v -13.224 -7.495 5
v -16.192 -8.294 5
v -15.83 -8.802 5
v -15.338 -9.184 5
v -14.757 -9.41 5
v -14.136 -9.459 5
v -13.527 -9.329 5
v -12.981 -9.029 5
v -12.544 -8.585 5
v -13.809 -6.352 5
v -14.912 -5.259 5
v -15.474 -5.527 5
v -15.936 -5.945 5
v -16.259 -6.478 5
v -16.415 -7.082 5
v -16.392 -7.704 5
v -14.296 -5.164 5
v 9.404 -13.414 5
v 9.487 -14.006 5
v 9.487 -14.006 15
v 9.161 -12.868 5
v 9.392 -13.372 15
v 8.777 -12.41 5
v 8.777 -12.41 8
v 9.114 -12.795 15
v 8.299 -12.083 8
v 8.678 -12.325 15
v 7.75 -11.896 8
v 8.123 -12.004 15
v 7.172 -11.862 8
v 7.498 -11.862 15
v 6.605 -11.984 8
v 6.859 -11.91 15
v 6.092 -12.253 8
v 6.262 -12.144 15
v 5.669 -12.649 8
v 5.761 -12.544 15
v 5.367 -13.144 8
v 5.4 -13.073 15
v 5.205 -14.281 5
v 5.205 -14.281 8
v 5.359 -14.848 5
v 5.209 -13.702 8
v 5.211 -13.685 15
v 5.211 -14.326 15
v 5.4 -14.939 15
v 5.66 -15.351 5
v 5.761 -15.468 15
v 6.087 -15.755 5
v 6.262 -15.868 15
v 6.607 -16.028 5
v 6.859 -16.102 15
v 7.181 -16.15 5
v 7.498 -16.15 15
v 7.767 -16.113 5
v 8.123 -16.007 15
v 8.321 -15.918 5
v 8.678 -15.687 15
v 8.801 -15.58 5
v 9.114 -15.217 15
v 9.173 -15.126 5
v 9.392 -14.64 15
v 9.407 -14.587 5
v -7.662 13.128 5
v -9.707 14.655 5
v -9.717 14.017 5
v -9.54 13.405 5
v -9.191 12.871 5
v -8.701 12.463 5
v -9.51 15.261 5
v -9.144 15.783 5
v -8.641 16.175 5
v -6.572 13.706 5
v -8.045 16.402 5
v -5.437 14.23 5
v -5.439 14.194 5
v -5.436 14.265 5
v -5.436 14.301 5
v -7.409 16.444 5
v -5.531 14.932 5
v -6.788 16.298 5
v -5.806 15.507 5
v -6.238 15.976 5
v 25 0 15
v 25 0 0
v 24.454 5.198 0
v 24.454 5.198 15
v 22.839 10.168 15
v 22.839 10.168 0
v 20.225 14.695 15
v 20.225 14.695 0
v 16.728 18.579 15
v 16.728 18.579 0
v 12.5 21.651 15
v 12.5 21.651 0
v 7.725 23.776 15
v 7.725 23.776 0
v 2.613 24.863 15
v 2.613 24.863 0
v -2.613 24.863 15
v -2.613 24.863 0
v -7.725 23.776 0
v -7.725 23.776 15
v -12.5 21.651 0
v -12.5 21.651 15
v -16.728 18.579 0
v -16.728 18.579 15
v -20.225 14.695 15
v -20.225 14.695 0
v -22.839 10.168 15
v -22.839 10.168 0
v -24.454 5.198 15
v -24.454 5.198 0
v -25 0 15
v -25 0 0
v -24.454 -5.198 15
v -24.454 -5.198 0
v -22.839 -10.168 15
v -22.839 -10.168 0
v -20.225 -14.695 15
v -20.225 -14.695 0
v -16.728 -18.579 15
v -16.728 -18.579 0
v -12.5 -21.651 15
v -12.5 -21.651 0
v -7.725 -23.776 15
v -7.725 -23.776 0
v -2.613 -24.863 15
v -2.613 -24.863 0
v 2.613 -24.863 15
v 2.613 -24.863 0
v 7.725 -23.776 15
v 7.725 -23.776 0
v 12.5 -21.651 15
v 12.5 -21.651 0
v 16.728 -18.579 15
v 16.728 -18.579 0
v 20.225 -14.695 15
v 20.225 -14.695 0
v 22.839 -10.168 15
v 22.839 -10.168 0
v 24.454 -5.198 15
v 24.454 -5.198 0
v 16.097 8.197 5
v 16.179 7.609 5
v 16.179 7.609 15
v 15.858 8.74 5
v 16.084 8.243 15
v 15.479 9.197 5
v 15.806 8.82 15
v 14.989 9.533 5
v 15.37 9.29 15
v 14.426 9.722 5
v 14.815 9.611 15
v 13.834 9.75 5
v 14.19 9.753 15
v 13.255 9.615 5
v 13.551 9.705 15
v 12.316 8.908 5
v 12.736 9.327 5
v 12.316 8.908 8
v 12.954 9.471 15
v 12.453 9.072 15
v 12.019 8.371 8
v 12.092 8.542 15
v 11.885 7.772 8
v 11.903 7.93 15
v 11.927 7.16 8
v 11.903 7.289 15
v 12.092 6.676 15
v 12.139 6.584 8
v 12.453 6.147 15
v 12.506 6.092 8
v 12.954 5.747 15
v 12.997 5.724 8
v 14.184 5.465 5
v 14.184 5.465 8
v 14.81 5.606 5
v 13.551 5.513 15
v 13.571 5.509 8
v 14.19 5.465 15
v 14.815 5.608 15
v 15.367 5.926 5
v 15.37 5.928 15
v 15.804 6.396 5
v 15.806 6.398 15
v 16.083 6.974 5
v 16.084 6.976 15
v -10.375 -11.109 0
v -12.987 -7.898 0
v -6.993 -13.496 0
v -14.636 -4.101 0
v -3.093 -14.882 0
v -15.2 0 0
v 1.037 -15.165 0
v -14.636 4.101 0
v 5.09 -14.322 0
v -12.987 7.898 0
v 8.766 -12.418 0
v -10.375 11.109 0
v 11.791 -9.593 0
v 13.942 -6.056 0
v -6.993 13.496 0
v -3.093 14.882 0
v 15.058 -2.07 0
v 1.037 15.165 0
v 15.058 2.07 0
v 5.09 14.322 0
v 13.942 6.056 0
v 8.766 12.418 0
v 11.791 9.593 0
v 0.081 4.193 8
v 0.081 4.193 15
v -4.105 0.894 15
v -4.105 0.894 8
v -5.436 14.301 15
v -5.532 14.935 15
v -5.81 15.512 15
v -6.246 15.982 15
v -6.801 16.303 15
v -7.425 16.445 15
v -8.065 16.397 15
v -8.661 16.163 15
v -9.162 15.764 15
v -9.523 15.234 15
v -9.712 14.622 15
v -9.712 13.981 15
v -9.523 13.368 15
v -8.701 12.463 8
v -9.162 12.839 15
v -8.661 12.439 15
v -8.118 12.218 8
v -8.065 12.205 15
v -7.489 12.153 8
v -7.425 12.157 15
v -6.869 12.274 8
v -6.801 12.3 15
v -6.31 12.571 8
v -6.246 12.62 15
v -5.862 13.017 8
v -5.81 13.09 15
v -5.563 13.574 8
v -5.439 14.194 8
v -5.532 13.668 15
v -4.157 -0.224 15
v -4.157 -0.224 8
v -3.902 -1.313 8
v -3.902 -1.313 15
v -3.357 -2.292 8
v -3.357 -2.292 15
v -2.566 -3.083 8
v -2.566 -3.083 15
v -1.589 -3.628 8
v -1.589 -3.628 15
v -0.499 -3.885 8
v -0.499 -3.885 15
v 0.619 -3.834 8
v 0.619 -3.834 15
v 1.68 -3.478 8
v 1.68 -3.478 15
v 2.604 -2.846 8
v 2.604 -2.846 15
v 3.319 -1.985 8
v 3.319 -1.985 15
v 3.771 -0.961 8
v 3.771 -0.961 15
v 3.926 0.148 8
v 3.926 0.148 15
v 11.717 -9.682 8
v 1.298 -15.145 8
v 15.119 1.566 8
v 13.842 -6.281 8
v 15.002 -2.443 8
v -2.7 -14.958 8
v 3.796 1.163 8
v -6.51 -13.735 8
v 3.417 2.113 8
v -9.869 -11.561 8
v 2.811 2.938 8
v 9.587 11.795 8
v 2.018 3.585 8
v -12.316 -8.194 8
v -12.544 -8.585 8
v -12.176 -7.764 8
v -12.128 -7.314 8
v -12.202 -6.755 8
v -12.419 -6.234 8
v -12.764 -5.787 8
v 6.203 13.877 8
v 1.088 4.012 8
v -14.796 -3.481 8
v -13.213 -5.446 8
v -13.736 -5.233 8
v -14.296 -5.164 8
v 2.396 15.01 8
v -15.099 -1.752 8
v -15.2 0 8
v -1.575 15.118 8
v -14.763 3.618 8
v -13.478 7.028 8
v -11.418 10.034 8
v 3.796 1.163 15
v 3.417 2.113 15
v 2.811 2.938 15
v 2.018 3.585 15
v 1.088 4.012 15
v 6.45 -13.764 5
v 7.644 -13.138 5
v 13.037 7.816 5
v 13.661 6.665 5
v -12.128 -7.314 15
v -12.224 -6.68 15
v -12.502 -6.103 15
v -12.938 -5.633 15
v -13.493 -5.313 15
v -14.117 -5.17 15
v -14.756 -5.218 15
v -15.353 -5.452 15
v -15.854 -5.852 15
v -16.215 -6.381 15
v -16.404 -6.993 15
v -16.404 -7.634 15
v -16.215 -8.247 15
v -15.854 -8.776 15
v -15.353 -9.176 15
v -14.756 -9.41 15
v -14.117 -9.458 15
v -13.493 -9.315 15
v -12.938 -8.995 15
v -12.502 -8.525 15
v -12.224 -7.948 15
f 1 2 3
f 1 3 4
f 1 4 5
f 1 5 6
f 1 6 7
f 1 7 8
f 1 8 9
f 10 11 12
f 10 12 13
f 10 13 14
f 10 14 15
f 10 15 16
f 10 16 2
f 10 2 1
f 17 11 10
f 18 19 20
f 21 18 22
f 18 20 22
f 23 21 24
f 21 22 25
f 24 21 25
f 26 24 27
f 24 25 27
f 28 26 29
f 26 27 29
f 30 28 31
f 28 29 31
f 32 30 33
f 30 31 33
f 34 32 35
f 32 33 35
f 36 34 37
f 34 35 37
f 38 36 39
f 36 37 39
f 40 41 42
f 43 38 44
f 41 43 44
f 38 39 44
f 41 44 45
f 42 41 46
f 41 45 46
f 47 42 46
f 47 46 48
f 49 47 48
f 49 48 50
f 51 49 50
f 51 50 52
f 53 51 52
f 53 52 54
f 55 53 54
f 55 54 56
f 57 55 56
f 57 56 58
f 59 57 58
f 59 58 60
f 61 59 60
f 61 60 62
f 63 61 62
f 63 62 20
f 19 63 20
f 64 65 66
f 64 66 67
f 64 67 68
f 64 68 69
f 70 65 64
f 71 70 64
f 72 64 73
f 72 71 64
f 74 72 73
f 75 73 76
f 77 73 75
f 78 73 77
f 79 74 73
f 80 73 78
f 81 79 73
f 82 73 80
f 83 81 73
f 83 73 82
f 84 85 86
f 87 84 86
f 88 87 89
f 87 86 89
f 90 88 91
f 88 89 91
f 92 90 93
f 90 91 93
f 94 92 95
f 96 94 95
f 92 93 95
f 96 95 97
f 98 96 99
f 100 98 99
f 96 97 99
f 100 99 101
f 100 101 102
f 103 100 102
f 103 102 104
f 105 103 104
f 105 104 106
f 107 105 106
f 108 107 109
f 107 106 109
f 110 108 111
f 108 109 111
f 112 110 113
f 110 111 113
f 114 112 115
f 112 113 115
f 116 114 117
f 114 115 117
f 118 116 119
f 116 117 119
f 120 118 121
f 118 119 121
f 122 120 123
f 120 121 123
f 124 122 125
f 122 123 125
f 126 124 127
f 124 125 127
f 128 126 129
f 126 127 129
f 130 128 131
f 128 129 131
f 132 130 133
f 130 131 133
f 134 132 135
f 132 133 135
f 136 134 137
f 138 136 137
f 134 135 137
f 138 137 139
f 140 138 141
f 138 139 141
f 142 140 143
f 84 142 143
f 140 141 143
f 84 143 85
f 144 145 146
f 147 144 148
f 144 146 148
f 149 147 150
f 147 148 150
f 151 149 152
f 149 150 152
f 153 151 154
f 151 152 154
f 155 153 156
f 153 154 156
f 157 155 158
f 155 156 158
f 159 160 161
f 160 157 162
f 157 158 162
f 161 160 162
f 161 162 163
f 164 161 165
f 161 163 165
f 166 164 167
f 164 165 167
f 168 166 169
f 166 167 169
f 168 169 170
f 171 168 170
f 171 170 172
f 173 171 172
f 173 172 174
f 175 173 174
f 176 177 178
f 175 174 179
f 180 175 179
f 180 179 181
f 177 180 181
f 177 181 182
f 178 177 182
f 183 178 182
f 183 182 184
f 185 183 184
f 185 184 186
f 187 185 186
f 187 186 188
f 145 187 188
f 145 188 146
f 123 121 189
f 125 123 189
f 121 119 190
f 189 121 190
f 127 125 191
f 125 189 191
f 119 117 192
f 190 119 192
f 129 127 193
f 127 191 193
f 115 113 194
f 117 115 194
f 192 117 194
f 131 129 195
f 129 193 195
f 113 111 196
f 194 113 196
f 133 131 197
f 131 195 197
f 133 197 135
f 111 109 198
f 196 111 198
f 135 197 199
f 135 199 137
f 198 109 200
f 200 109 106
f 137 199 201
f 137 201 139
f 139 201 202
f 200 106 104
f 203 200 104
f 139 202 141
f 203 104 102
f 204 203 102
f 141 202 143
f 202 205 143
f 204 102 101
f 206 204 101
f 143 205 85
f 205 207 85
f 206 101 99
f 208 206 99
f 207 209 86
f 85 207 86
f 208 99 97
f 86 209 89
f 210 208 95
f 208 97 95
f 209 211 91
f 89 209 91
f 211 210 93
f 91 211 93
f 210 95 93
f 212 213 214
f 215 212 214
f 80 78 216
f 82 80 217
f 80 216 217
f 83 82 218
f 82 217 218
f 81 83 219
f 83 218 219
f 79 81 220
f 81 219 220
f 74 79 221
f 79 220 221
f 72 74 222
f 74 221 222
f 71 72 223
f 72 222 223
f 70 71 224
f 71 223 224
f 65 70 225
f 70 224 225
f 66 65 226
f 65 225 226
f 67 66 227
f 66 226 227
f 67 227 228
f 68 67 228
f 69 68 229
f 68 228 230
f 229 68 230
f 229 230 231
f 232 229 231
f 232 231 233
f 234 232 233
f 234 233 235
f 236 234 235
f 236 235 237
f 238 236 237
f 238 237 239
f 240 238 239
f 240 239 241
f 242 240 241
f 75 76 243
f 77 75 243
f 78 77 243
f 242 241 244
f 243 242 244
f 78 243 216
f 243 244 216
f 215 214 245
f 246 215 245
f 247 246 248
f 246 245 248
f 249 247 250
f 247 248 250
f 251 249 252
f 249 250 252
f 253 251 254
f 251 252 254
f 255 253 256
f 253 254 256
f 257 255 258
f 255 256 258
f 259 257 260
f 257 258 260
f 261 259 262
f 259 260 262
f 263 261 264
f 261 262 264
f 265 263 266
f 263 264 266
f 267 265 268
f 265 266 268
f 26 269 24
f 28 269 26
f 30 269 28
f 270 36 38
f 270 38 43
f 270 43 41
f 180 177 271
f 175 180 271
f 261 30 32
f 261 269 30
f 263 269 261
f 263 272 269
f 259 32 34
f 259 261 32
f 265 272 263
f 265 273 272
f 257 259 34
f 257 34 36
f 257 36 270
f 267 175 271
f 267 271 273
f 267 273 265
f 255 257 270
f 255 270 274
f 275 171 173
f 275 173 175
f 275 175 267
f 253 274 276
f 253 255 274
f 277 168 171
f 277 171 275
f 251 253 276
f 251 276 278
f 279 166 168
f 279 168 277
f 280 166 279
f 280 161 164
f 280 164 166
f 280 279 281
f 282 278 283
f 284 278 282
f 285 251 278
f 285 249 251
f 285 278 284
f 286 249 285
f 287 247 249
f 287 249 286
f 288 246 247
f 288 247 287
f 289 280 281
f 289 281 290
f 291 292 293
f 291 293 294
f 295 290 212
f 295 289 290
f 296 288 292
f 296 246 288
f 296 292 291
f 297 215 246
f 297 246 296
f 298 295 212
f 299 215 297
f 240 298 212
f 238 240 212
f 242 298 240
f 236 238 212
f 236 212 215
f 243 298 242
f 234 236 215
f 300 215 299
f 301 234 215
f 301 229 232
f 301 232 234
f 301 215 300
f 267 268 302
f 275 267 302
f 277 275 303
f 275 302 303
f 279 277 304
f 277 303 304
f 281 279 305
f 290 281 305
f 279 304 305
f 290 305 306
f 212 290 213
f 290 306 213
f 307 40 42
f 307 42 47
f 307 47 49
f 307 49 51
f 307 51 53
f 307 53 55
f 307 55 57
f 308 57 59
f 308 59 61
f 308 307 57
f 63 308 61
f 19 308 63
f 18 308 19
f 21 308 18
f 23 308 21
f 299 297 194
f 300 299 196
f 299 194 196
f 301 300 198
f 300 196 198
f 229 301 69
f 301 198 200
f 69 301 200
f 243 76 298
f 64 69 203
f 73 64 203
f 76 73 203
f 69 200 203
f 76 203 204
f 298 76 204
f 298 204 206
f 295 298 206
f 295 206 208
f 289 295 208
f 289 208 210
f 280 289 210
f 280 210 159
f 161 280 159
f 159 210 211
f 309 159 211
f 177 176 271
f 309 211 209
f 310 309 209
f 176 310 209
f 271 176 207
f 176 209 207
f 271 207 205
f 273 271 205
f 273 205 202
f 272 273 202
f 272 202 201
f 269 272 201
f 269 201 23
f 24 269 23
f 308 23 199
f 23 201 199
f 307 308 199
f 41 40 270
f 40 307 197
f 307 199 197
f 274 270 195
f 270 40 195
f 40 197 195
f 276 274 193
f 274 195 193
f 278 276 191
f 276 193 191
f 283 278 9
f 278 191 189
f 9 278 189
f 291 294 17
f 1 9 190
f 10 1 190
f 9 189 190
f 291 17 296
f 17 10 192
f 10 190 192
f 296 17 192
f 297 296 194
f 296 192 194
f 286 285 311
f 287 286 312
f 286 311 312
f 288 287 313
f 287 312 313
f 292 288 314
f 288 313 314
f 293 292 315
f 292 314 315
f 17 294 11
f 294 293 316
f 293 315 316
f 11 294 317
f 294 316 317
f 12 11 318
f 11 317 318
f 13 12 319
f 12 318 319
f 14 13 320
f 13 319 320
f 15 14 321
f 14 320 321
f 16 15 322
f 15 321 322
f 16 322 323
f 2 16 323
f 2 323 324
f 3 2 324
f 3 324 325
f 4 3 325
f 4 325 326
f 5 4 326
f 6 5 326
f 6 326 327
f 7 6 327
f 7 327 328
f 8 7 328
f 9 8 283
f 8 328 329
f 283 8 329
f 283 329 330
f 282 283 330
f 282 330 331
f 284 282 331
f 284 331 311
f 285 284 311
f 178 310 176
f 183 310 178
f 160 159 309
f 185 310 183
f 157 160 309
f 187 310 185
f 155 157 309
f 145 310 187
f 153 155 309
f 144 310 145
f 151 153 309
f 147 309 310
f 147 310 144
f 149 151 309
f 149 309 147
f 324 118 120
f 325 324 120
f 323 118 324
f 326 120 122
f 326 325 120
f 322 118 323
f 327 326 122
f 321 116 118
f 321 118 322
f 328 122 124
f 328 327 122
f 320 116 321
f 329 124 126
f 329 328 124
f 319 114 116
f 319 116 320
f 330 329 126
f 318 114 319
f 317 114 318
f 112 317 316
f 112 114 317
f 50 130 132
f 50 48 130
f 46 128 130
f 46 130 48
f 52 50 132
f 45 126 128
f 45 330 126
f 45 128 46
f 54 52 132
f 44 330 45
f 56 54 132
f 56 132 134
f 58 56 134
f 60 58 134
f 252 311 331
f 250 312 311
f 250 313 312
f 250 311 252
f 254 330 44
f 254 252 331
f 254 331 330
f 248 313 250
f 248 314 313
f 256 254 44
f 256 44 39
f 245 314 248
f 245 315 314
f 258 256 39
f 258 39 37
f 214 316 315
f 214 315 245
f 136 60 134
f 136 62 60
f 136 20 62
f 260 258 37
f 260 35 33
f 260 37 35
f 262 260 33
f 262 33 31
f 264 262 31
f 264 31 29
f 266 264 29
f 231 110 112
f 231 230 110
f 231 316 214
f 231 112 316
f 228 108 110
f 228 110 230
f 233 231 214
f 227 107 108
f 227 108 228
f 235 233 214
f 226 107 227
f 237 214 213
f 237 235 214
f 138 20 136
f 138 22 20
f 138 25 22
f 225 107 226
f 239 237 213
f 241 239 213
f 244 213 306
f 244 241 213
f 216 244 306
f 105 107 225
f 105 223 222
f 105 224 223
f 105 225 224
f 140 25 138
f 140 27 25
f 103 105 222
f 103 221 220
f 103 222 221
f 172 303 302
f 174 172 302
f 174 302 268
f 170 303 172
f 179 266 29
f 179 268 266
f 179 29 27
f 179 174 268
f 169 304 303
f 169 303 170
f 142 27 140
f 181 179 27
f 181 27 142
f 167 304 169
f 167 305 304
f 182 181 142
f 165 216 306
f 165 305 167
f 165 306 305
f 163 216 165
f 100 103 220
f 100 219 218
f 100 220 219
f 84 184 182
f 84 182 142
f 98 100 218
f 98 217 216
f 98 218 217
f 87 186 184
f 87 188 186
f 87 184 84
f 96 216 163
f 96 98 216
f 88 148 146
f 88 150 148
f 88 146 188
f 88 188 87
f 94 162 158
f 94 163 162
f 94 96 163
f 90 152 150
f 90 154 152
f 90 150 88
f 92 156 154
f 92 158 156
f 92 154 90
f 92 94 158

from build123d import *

# Parameters (mm, degrees)
SKETCH_1_R          = 25
EXTRUDE_1_DEPTH     = 15
SKETCH_2_R          = 15.2
CUT_EXTRUDE_1_DEPTH = 8
SKETCH_3_R          = 2.15
CUT_EXTRUDE_2_DEPTH = 10
CUT_EXTRUDE_3_DEPTH = 39.405728739


with BuildPart() as part:
    # 草图1 → 凸台-拉伸1 (new body)
    with BuildSketch(Plane.XY):
        Circle(SKETCH_1_R)
    extrude(amount=EXTRUDE_1_DEPTH)

    # 草图2 → 切除-拉伸1 (cut)
    with BuildSketch(Plane(origin=(0, 0, 0), x_dir=(-1, 0, 0), z_dir=(0, 0, -1))):
        Circle(SKETCH_2_R)
    extrude(amount=-CUT_EXTRUDE_1_DEPTH, mode=Mode.SUBTRACT)

    # 草图3 → 切除-拉伸2 (cut)
    with BuildSketch(Plane.XY.offset(15)):
        with Locations((-14.278039738, -7.313917654)):
            Circle(SKETCH_3_R)
        with Locations((-7.586084988, 14.301302484)):
            Circle(SKETCH_3_R)
        with Locations((14.029135151, 7.609347734)):
            Circle(SKETCH_3_R)
        with Locations((7.3371804, -14.005872405)):
            Circle(SKETCH_3_R)
    extrude(amount=-CUT_EXTRUDE_2_DEPTH, mode=Mode.SUBTRACT)

    # 草图4 → 切除-拉伸3 (cut, through all)
    with BuildSketch(Plane.XY.offset(15)):
        with BuildLine():
            ThreePointArc((3.925547706, 0.14771504), (2.811003713, 2.937983491), (0.080807938, 4.192510243))
            Line((0.080807938, 4.192510243), (-4.105054455, 0.894244634))
            ThreePointArc((-4.105054455, 0.894244634), (-0.499326438, -3.88489818), (3.925547706, 0.14771504))
        make_face()
    extrude(amount=-CUT_EXTRUDE_3_DEPTH, mode=Mode.SUBTRACT)


solid = part.part
